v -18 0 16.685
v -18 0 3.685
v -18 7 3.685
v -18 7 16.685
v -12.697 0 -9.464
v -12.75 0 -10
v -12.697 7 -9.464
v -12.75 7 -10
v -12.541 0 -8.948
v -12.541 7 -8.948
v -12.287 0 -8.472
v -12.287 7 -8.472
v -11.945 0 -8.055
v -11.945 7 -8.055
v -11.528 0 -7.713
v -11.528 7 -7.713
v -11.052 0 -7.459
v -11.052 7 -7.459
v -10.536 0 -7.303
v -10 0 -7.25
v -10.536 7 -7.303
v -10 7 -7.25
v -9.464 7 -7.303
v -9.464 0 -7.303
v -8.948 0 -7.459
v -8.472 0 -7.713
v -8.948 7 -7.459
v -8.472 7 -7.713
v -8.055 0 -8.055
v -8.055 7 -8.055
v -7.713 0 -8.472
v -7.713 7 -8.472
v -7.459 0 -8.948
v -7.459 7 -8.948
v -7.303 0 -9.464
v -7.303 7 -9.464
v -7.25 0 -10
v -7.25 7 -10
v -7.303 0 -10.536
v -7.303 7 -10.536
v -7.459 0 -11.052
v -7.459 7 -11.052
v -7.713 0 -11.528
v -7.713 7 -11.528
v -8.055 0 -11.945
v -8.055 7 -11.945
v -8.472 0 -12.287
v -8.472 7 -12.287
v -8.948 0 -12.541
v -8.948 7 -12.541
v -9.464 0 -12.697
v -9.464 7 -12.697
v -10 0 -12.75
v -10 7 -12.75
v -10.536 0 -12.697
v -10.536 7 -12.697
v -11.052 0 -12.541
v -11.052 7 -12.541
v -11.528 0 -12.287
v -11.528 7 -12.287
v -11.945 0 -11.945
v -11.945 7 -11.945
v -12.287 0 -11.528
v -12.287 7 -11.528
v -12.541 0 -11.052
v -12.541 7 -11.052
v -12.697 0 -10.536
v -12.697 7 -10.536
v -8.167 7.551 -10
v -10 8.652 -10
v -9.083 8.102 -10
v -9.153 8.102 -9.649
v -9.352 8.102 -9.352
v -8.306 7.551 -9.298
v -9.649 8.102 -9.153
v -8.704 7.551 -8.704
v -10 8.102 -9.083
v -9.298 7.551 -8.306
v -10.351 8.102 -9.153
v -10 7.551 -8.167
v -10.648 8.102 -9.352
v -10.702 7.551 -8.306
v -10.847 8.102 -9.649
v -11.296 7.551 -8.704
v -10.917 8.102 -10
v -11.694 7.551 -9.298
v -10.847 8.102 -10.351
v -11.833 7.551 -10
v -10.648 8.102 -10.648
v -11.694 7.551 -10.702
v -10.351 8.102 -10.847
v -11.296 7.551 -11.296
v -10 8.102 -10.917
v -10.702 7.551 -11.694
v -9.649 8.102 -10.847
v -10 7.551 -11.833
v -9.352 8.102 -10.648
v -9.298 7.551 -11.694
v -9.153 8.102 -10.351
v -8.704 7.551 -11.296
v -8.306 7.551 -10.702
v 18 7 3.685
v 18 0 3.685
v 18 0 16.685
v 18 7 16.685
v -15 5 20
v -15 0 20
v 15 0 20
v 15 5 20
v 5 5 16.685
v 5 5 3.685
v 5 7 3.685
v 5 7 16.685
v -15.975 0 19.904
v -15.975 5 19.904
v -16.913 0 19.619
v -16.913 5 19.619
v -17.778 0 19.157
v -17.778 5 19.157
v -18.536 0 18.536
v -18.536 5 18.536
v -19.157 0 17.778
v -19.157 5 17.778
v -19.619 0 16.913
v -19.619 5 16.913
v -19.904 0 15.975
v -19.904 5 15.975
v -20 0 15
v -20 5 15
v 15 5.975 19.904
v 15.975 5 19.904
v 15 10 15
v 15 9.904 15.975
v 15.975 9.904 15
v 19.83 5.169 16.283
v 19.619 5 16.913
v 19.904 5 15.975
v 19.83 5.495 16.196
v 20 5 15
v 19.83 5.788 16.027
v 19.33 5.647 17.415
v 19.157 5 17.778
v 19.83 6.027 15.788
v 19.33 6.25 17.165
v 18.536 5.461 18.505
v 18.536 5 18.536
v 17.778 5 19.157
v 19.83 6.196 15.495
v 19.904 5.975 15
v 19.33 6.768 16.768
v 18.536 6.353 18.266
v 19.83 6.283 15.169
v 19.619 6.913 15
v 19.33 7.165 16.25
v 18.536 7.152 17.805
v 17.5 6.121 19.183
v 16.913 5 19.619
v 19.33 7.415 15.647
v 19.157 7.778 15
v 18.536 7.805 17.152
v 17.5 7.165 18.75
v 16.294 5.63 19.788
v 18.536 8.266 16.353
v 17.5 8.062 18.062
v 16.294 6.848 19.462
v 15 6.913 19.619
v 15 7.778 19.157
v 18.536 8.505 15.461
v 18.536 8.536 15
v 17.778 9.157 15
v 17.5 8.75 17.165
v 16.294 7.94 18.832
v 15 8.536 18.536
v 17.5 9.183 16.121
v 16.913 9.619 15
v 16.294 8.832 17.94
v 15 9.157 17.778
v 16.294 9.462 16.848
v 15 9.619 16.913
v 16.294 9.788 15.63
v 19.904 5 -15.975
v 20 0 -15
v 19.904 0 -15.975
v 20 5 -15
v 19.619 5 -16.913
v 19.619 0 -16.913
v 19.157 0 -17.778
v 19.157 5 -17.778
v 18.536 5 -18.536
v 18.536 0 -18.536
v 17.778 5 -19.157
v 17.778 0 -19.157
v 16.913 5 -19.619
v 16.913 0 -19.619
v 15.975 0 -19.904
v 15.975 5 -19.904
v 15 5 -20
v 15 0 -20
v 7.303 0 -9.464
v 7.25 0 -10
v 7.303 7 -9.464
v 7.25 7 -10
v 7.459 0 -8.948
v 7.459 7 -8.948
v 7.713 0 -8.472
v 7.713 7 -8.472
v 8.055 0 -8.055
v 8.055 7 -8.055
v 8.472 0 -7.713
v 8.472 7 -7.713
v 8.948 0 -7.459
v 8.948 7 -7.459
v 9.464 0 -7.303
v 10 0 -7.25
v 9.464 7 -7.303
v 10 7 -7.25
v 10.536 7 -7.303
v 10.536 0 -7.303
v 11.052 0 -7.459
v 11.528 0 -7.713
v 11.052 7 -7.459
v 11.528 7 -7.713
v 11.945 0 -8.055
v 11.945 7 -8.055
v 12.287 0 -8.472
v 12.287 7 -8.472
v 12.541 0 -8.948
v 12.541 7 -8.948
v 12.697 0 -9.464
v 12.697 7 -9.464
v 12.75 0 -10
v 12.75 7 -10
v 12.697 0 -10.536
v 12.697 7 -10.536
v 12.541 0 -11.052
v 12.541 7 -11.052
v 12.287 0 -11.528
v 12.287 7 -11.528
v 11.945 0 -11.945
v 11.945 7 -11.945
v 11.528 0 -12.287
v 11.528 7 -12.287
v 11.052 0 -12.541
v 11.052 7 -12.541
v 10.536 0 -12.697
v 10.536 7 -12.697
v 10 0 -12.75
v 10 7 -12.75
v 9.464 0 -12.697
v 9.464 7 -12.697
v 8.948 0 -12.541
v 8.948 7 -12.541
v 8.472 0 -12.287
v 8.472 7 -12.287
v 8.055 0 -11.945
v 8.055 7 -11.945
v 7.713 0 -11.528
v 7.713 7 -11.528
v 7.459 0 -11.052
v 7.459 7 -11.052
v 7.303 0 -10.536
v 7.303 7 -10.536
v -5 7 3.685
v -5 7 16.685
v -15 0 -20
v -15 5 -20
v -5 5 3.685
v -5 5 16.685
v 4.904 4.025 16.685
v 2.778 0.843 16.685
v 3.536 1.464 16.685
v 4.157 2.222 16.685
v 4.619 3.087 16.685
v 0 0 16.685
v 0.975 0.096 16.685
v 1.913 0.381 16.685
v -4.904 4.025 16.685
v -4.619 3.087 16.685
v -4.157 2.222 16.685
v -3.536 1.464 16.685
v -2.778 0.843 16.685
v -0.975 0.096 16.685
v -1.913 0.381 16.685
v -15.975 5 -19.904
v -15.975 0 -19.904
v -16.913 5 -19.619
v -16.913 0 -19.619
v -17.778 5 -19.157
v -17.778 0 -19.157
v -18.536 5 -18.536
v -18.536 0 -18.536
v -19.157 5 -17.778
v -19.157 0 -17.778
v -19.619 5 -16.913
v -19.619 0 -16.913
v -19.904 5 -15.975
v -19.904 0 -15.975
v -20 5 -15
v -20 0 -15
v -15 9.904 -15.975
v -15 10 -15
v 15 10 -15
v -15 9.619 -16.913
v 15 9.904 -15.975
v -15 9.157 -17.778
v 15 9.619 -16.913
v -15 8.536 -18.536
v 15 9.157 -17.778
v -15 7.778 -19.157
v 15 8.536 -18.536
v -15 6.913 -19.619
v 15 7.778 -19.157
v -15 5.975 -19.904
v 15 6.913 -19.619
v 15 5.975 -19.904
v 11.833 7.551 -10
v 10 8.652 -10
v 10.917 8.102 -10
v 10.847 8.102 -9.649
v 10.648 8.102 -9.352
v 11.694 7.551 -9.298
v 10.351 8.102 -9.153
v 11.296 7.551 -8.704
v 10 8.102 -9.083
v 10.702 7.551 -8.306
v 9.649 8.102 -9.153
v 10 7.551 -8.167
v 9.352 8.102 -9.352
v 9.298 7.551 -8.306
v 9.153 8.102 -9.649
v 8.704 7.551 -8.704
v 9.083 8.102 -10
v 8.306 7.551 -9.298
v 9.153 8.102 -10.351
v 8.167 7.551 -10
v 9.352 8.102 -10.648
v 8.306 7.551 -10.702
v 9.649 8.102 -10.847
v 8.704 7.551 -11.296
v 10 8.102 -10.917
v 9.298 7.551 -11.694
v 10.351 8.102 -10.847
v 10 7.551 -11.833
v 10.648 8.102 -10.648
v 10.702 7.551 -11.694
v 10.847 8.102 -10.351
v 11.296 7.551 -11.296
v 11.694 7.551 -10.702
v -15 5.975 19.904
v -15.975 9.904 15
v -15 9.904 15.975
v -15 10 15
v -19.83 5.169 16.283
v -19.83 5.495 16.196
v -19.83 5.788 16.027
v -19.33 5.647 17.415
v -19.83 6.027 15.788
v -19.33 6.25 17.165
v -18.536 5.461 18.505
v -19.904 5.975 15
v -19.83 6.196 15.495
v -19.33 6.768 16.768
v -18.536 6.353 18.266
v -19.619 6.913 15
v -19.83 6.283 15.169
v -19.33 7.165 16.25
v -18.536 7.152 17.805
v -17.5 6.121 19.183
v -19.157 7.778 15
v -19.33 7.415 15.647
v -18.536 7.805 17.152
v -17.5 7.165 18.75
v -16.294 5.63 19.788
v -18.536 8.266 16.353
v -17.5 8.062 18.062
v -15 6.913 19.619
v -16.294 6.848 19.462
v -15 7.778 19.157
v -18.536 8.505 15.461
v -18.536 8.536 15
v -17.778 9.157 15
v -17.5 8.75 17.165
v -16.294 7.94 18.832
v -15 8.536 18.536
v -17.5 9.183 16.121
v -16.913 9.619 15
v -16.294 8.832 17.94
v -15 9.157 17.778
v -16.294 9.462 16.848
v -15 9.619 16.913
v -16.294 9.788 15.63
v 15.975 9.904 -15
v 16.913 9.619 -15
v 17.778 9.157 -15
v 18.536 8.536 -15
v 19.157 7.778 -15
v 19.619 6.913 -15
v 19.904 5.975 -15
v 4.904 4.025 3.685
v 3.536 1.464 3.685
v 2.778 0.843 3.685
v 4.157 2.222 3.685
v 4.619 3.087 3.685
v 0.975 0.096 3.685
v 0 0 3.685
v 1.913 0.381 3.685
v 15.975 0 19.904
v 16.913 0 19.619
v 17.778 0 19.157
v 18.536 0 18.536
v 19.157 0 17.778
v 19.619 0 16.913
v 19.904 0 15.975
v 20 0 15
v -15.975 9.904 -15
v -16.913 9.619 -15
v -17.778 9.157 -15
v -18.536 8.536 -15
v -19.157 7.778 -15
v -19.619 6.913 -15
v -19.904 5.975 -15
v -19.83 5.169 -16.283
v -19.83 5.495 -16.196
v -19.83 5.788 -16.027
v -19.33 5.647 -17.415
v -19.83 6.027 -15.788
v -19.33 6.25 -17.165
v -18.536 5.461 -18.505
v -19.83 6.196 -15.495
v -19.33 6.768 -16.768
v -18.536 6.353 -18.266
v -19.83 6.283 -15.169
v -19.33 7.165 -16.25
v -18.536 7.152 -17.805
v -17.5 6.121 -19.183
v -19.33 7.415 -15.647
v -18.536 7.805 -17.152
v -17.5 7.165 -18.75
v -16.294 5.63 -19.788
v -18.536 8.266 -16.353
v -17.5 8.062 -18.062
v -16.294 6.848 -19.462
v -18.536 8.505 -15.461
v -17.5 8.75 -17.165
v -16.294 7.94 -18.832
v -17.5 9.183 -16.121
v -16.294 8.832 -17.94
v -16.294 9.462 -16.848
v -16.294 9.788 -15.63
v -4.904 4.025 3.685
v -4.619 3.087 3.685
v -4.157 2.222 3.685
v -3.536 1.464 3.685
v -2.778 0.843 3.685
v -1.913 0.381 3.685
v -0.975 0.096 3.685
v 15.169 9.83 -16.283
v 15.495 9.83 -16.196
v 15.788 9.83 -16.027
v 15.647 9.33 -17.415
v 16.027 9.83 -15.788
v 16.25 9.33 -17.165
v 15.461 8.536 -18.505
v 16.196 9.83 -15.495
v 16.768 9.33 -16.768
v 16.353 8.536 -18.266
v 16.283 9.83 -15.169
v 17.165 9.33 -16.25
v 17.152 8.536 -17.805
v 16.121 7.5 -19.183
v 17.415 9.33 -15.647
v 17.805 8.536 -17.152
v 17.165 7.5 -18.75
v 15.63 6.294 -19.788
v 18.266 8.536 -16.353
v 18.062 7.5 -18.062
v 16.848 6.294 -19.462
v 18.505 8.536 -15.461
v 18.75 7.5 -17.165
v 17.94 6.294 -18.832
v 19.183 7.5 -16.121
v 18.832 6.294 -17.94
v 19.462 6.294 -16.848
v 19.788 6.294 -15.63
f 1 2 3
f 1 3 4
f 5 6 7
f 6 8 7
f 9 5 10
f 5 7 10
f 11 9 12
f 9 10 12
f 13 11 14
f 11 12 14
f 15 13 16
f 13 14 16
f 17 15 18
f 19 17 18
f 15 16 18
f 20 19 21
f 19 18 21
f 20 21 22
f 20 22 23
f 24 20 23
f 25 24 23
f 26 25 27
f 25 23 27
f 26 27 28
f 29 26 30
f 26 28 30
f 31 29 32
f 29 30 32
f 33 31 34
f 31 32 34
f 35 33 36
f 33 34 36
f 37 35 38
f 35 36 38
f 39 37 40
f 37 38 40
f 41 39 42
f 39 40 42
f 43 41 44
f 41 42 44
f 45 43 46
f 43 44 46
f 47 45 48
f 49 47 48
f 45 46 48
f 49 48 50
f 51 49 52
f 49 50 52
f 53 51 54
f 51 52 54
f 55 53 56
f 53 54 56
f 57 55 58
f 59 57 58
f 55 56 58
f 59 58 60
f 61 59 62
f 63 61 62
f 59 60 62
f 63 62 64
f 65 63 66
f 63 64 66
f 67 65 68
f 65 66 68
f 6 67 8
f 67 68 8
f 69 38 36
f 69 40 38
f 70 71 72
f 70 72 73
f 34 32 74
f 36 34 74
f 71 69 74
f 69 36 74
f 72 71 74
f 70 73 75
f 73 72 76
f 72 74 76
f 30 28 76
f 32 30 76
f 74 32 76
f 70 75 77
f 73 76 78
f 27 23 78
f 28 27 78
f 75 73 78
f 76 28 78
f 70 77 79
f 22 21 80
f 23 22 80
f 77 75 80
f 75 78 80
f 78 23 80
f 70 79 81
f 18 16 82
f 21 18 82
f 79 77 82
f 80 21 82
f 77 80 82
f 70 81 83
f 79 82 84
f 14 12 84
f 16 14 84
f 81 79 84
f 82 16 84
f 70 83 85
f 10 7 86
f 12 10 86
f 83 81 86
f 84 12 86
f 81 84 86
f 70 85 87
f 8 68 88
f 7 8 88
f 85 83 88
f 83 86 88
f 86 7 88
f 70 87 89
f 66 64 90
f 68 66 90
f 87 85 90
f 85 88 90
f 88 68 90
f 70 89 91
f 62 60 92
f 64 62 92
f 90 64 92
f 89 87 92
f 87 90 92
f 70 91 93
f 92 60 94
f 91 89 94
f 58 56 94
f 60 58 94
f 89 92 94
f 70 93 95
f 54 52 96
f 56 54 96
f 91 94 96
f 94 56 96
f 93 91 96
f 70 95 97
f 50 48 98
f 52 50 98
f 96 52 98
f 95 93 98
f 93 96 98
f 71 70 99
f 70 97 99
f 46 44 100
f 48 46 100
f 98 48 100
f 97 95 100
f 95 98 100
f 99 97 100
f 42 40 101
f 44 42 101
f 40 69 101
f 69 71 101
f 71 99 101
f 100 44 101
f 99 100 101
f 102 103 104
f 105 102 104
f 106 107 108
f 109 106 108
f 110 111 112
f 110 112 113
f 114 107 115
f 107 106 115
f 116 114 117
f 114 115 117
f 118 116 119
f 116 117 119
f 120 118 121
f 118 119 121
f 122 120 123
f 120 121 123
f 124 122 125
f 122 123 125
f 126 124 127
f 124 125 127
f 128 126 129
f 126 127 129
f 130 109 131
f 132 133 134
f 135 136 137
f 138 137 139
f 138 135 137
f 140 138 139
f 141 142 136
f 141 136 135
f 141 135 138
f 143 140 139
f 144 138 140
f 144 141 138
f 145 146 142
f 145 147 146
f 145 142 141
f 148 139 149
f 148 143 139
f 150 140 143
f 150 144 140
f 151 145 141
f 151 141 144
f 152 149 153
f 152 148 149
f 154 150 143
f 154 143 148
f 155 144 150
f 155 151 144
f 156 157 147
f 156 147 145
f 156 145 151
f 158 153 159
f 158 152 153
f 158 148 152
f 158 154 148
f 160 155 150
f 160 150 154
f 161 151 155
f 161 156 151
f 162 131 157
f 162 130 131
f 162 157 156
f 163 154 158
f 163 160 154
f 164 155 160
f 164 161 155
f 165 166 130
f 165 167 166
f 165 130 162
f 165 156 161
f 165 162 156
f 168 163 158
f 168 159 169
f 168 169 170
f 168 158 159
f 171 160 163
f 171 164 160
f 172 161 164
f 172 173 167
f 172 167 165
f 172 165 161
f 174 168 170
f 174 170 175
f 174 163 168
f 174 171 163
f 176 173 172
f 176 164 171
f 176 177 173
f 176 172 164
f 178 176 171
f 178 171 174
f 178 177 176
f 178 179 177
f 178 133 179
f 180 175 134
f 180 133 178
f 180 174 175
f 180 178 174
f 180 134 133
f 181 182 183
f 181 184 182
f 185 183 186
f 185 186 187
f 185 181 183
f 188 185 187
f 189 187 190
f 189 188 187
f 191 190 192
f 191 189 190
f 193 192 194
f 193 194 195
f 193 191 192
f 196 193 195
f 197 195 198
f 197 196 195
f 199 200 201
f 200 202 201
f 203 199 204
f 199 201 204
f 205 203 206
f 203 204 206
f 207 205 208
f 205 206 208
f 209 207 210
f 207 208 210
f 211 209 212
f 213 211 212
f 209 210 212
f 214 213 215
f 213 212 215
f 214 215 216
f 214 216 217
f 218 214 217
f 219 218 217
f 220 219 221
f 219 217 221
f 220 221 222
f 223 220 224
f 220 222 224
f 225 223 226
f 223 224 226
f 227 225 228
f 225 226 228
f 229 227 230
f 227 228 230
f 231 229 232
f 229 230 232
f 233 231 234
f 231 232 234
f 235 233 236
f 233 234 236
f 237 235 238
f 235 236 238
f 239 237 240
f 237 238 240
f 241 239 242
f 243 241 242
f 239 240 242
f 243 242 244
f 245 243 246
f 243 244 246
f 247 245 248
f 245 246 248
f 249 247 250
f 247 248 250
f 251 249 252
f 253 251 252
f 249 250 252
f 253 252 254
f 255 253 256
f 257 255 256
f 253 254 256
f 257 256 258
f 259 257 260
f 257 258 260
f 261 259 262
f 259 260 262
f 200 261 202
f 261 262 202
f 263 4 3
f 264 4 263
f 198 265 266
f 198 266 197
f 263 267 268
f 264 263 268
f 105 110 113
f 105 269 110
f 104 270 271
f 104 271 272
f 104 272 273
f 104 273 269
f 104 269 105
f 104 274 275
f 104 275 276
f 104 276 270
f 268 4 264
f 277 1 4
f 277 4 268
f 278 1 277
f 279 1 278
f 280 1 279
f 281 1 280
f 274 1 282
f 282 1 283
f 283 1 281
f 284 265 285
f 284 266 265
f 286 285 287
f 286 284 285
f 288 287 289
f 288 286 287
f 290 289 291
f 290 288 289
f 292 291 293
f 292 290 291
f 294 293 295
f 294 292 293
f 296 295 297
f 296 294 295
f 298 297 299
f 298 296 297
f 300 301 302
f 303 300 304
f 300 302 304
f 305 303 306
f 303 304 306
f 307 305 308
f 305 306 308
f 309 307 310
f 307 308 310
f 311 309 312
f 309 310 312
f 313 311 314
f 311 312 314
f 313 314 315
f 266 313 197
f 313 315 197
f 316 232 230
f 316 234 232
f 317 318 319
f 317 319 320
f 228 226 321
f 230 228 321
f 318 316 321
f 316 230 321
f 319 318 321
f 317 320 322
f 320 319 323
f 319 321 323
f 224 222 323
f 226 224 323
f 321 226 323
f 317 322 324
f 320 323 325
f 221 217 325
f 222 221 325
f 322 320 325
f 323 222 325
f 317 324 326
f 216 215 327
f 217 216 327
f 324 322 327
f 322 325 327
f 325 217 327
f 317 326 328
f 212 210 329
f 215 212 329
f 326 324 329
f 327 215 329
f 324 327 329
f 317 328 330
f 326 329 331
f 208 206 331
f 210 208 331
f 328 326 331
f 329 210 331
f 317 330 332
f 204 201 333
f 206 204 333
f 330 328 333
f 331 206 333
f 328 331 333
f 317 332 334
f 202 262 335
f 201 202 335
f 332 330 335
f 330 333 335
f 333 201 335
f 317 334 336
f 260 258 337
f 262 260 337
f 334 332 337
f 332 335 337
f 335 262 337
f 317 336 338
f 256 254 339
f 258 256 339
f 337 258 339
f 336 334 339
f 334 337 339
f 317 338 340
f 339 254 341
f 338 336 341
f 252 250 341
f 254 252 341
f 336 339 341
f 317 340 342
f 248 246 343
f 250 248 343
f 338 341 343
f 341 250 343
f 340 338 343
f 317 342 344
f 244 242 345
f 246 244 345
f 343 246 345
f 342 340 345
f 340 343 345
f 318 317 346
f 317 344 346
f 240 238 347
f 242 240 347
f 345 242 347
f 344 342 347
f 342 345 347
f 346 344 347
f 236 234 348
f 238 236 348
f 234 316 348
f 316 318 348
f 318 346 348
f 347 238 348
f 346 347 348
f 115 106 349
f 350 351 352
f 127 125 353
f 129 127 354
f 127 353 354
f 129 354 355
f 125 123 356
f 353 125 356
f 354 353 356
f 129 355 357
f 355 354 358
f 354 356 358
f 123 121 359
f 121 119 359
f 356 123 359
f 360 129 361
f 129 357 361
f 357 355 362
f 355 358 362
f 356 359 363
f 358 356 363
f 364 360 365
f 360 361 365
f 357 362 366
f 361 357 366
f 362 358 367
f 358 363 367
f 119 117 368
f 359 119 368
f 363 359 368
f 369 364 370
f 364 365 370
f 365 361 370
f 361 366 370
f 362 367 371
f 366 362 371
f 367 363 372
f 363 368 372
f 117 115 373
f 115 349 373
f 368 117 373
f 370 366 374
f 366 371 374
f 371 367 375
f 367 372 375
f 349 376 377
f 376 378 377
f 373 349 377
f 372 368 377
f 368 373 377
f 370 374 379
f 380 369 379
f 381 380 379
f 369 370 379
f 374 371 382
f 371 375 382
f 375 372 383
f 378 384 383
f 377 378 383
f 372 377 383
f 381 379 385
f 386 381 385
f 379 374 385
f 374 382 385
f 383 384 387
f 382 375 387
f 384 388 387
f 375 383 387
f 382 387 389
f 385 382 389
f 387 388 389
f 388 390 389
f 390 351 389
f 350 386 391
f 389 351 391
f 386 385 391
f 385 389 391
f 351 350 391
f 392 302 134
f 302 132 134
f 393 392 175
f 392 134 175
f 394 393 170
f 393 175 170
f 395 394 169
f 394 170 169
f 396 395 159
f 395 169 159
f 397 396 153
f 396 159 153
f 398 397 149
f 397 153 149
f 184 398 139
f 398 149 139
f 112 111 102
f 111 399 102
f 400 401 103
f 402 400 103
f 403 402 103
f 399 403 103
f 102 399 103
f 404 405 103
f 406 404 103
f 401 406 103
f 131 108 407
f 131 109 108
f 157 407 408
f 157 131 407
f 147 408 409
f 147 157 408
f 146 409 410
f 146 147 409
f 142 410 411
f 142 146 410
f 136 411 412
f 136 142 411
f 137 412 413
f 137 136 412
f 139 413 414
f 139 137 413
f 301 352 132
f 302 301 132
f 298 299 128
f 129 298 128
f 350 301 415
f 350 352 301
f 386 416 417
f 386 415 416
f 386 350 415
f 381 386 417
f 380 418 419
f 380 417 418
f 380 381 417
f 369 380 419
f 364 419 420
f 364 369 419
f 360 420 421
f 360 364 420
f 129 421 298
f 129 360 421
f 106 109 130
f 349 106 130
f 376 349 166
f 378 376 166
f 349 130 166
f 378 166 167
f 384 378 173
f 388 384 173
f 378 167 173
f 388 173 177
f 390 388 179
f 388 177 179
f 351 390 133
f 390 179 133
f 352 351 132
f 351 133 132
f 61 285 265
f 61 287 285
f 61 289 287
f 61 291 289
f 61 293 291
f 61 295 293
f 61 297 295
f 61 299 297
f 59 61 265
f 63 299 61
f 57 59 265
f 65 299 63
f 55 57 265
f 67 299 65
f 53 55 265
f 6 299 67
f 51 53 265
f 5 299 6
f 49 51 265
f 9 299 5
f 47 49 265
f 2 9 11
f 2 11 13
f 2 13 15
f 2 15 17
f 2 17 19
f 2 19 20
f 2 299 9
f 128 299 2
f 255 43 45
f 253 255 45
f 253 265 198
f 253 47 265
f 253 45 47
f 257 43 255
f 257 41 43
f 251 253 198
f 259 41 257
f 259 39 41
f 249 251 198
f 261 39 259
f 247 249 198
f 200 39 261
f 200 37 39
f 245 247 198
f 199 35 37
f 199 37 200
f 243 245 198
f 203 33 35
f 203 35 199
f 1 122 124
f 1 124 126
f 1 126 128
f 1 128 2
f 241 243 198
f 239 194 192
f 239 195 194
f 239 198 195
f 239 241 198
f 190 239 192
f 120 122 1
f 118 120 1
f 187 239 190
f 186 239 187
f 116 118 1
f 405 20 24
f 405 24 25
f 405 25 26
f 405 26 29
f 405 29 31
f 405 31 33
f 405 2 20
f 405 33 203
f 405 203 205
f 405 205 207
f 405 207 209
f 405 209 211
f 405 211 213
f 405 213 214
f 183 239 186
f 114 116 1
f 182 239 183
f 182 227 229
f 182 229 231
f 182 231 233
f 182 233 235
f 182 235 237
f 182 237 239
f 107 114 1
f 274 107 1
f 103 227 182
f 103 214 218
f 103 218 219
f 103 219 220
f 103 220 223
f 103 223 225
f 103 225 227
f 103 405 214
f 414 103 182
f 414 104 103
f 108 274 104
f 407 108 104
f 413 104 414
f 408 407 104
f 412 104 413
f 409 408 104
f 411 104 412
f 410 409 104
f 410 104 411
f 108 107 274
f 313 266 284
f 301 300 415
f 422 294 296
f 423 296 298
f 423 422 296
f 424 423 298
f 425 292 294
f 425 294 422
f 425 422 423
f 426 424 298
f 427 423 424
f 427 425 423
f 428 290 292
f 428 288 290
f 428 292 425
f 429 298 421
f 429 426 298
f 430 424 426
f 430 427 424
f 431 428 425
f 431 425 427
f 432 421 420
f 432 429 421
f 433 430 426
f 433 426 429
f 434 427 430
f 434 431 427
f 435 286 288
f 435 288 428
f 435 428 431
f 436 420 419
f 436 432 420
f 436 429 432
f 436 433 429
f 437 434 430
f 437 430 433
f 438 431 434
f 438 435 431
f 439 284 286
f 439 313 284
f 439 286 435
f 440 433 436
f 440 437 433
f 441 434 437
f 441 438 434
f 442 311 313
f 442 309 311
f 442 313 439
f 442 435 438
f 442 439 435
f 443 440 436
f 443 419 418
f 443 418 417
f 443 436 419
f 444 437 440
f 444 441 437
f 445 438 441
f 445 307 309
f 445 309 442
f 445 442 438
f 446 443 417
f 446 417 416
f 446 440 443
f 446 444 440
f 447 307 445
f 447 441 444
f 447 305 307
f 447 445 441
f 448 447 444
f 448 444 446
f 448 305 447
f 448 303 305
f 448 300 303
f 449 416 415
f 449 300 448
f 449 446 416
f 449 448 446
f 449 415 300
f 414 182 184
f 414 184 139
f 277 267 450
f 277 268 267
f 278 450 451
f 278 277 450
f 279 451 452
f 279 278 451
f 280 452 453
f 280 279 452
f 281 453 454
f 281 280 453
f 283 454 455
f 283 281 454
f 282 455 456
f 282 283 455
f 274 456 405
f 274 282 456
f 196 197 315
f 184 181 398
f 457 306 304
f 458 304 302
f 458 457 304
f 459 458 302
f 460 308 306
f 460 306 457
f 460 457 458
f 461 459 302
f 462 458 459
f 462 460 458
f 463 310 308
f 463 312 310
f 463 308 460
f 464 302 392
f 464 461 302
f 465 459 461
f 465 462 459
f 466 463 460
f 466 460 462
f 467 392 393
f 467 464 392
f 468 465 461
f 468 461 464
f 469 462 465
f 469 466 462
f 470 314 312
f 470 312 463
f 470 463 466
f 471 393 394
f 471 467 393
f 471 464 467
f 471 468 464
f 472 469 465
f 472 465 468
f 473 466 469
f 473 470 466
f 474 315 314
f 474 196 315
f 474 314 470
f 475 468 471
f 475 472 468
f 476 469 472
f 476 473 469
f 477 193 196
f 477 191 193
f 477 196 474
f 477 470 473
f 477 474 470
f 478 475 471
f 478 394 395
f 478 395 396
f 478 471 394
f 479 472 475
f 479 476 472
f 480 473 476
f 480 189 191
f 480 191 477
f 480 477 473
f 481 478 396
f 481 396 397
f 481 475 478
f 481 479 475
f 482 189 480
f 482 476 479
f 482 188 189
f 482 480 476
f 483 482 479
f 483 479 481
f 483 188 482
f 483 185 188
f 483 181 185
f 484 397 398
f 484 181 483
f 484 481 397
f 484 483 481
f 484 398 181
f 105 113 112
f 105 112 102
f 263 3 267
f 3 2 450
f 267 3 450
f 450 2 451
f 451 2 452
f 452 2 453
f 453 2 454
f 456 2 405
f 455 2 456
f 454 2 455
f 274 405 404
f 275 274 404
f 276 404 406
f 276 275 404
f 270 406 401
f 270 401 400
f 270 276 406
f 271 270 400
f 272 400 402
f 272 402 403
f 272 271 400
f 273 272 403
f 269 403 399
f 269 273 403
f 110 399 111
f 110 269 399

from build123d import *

# Parameters (mm, degrees)
F0_W     = 40
F0_H     = 40
F0_W_2   = 13
F0_H_2   = 13
F1_DEPTH = 10
F2_DEPTH = 7
F0_W_3   = 10
F3_DEPTH = 10
F4_R     = 4.99999
F5_R     = 5
F6_D     = 5.5
F6_DEPTH = 7
F6_TIP   = 1.6523667023


# Not quite as in the source:
# - a fillet or chamfer is up to 0.001 mm smaller than in the source, because OpenCascade refuses the exact size
# - a feature names something its author has since deleted; it is built from what else it names


with BuildPart() as f1:
    # F0 (on Front) → F1 (new body)
    with BuildSketch(Plane.XZ):
        Rectangle(F0_W, F0_H)
        Polygon((-18, 3.6852569133), (-18, 16.6852569133), (-5, 16.6852569133), (5, 16.6852569133), (18, 16.6852569133), (18, 3.6852569133), (5, 3.6852569133), (-5, 3.6852569133), align=None, mode=Mode.SUBTRACT)
        with Locations((-11.5, 10.1852569133)):
            Rectangle(F0_W_2, F0_H_2)
        with Locations((11.5, 10.1852569133)):
            Rectangle(F0_W_2, F0_H_2)
    extrude(amount=-F1_DEPTH)

    # F0 (on Front) → F2 (cut)
    with BuildSketch(Plane.XZ):
        with Locations((-11.5, 10.1852569133)):
            Rectangle(F0_W_2, F0_H_2)
        with Locations((11.5, 10.1852569133)):
            Rectangle(F0_W_2, F0_H_2)
    extrude(amount=-F2_DEPTH, mode=Mode.SUBTRACT)

    # F0 (on Front) → F3 (join)
    with BuildSketch(Plane.XZ):
        with Locations((0, 10.1852569133)):
            Rectangle(F0_W_3, F0_H_2)
    extrude(amount=-F3_DEPTH)

    # F4 (radius 5 in the source; OpenCascade refuses exactly that, so slightly less here)
    f4_edges = [f1.edges().sort_by_distance(p)[0] for p in [
        (5, 0, 10.185257),
        (-5, 0, 10.185257),
    ]]
    fillet(f4_edges, radius=F4_R)

    # F5
    f5_edges = [f1.edges().sort_by_distance(p)[0] for p in [
        (0, 10, 20),
        (20, 5, 20),
        (-20, 5, 20),
        (20, 5, -20),
        (0, 10, -20),
        (-20, 5, -20),
        (-20, 10, 0),
        (20, 10, 0),
    ]]
    fillet(f5_edges, radius=F5_R)

    # F6
    with Locations(Plane.XZ):
        with Locations((-10, -10), (10, -10)):
            Hole(F6_D / 2, depth=F6_DEPTH)
            with Locations((0, 0, -(F6_DEPTH + F6_TIP / 2))):  # 118° drill point
                Cone(0, F6_D / 2, F6_TIP, mode=Mode.SUBTRACT)


solid = f1.part
